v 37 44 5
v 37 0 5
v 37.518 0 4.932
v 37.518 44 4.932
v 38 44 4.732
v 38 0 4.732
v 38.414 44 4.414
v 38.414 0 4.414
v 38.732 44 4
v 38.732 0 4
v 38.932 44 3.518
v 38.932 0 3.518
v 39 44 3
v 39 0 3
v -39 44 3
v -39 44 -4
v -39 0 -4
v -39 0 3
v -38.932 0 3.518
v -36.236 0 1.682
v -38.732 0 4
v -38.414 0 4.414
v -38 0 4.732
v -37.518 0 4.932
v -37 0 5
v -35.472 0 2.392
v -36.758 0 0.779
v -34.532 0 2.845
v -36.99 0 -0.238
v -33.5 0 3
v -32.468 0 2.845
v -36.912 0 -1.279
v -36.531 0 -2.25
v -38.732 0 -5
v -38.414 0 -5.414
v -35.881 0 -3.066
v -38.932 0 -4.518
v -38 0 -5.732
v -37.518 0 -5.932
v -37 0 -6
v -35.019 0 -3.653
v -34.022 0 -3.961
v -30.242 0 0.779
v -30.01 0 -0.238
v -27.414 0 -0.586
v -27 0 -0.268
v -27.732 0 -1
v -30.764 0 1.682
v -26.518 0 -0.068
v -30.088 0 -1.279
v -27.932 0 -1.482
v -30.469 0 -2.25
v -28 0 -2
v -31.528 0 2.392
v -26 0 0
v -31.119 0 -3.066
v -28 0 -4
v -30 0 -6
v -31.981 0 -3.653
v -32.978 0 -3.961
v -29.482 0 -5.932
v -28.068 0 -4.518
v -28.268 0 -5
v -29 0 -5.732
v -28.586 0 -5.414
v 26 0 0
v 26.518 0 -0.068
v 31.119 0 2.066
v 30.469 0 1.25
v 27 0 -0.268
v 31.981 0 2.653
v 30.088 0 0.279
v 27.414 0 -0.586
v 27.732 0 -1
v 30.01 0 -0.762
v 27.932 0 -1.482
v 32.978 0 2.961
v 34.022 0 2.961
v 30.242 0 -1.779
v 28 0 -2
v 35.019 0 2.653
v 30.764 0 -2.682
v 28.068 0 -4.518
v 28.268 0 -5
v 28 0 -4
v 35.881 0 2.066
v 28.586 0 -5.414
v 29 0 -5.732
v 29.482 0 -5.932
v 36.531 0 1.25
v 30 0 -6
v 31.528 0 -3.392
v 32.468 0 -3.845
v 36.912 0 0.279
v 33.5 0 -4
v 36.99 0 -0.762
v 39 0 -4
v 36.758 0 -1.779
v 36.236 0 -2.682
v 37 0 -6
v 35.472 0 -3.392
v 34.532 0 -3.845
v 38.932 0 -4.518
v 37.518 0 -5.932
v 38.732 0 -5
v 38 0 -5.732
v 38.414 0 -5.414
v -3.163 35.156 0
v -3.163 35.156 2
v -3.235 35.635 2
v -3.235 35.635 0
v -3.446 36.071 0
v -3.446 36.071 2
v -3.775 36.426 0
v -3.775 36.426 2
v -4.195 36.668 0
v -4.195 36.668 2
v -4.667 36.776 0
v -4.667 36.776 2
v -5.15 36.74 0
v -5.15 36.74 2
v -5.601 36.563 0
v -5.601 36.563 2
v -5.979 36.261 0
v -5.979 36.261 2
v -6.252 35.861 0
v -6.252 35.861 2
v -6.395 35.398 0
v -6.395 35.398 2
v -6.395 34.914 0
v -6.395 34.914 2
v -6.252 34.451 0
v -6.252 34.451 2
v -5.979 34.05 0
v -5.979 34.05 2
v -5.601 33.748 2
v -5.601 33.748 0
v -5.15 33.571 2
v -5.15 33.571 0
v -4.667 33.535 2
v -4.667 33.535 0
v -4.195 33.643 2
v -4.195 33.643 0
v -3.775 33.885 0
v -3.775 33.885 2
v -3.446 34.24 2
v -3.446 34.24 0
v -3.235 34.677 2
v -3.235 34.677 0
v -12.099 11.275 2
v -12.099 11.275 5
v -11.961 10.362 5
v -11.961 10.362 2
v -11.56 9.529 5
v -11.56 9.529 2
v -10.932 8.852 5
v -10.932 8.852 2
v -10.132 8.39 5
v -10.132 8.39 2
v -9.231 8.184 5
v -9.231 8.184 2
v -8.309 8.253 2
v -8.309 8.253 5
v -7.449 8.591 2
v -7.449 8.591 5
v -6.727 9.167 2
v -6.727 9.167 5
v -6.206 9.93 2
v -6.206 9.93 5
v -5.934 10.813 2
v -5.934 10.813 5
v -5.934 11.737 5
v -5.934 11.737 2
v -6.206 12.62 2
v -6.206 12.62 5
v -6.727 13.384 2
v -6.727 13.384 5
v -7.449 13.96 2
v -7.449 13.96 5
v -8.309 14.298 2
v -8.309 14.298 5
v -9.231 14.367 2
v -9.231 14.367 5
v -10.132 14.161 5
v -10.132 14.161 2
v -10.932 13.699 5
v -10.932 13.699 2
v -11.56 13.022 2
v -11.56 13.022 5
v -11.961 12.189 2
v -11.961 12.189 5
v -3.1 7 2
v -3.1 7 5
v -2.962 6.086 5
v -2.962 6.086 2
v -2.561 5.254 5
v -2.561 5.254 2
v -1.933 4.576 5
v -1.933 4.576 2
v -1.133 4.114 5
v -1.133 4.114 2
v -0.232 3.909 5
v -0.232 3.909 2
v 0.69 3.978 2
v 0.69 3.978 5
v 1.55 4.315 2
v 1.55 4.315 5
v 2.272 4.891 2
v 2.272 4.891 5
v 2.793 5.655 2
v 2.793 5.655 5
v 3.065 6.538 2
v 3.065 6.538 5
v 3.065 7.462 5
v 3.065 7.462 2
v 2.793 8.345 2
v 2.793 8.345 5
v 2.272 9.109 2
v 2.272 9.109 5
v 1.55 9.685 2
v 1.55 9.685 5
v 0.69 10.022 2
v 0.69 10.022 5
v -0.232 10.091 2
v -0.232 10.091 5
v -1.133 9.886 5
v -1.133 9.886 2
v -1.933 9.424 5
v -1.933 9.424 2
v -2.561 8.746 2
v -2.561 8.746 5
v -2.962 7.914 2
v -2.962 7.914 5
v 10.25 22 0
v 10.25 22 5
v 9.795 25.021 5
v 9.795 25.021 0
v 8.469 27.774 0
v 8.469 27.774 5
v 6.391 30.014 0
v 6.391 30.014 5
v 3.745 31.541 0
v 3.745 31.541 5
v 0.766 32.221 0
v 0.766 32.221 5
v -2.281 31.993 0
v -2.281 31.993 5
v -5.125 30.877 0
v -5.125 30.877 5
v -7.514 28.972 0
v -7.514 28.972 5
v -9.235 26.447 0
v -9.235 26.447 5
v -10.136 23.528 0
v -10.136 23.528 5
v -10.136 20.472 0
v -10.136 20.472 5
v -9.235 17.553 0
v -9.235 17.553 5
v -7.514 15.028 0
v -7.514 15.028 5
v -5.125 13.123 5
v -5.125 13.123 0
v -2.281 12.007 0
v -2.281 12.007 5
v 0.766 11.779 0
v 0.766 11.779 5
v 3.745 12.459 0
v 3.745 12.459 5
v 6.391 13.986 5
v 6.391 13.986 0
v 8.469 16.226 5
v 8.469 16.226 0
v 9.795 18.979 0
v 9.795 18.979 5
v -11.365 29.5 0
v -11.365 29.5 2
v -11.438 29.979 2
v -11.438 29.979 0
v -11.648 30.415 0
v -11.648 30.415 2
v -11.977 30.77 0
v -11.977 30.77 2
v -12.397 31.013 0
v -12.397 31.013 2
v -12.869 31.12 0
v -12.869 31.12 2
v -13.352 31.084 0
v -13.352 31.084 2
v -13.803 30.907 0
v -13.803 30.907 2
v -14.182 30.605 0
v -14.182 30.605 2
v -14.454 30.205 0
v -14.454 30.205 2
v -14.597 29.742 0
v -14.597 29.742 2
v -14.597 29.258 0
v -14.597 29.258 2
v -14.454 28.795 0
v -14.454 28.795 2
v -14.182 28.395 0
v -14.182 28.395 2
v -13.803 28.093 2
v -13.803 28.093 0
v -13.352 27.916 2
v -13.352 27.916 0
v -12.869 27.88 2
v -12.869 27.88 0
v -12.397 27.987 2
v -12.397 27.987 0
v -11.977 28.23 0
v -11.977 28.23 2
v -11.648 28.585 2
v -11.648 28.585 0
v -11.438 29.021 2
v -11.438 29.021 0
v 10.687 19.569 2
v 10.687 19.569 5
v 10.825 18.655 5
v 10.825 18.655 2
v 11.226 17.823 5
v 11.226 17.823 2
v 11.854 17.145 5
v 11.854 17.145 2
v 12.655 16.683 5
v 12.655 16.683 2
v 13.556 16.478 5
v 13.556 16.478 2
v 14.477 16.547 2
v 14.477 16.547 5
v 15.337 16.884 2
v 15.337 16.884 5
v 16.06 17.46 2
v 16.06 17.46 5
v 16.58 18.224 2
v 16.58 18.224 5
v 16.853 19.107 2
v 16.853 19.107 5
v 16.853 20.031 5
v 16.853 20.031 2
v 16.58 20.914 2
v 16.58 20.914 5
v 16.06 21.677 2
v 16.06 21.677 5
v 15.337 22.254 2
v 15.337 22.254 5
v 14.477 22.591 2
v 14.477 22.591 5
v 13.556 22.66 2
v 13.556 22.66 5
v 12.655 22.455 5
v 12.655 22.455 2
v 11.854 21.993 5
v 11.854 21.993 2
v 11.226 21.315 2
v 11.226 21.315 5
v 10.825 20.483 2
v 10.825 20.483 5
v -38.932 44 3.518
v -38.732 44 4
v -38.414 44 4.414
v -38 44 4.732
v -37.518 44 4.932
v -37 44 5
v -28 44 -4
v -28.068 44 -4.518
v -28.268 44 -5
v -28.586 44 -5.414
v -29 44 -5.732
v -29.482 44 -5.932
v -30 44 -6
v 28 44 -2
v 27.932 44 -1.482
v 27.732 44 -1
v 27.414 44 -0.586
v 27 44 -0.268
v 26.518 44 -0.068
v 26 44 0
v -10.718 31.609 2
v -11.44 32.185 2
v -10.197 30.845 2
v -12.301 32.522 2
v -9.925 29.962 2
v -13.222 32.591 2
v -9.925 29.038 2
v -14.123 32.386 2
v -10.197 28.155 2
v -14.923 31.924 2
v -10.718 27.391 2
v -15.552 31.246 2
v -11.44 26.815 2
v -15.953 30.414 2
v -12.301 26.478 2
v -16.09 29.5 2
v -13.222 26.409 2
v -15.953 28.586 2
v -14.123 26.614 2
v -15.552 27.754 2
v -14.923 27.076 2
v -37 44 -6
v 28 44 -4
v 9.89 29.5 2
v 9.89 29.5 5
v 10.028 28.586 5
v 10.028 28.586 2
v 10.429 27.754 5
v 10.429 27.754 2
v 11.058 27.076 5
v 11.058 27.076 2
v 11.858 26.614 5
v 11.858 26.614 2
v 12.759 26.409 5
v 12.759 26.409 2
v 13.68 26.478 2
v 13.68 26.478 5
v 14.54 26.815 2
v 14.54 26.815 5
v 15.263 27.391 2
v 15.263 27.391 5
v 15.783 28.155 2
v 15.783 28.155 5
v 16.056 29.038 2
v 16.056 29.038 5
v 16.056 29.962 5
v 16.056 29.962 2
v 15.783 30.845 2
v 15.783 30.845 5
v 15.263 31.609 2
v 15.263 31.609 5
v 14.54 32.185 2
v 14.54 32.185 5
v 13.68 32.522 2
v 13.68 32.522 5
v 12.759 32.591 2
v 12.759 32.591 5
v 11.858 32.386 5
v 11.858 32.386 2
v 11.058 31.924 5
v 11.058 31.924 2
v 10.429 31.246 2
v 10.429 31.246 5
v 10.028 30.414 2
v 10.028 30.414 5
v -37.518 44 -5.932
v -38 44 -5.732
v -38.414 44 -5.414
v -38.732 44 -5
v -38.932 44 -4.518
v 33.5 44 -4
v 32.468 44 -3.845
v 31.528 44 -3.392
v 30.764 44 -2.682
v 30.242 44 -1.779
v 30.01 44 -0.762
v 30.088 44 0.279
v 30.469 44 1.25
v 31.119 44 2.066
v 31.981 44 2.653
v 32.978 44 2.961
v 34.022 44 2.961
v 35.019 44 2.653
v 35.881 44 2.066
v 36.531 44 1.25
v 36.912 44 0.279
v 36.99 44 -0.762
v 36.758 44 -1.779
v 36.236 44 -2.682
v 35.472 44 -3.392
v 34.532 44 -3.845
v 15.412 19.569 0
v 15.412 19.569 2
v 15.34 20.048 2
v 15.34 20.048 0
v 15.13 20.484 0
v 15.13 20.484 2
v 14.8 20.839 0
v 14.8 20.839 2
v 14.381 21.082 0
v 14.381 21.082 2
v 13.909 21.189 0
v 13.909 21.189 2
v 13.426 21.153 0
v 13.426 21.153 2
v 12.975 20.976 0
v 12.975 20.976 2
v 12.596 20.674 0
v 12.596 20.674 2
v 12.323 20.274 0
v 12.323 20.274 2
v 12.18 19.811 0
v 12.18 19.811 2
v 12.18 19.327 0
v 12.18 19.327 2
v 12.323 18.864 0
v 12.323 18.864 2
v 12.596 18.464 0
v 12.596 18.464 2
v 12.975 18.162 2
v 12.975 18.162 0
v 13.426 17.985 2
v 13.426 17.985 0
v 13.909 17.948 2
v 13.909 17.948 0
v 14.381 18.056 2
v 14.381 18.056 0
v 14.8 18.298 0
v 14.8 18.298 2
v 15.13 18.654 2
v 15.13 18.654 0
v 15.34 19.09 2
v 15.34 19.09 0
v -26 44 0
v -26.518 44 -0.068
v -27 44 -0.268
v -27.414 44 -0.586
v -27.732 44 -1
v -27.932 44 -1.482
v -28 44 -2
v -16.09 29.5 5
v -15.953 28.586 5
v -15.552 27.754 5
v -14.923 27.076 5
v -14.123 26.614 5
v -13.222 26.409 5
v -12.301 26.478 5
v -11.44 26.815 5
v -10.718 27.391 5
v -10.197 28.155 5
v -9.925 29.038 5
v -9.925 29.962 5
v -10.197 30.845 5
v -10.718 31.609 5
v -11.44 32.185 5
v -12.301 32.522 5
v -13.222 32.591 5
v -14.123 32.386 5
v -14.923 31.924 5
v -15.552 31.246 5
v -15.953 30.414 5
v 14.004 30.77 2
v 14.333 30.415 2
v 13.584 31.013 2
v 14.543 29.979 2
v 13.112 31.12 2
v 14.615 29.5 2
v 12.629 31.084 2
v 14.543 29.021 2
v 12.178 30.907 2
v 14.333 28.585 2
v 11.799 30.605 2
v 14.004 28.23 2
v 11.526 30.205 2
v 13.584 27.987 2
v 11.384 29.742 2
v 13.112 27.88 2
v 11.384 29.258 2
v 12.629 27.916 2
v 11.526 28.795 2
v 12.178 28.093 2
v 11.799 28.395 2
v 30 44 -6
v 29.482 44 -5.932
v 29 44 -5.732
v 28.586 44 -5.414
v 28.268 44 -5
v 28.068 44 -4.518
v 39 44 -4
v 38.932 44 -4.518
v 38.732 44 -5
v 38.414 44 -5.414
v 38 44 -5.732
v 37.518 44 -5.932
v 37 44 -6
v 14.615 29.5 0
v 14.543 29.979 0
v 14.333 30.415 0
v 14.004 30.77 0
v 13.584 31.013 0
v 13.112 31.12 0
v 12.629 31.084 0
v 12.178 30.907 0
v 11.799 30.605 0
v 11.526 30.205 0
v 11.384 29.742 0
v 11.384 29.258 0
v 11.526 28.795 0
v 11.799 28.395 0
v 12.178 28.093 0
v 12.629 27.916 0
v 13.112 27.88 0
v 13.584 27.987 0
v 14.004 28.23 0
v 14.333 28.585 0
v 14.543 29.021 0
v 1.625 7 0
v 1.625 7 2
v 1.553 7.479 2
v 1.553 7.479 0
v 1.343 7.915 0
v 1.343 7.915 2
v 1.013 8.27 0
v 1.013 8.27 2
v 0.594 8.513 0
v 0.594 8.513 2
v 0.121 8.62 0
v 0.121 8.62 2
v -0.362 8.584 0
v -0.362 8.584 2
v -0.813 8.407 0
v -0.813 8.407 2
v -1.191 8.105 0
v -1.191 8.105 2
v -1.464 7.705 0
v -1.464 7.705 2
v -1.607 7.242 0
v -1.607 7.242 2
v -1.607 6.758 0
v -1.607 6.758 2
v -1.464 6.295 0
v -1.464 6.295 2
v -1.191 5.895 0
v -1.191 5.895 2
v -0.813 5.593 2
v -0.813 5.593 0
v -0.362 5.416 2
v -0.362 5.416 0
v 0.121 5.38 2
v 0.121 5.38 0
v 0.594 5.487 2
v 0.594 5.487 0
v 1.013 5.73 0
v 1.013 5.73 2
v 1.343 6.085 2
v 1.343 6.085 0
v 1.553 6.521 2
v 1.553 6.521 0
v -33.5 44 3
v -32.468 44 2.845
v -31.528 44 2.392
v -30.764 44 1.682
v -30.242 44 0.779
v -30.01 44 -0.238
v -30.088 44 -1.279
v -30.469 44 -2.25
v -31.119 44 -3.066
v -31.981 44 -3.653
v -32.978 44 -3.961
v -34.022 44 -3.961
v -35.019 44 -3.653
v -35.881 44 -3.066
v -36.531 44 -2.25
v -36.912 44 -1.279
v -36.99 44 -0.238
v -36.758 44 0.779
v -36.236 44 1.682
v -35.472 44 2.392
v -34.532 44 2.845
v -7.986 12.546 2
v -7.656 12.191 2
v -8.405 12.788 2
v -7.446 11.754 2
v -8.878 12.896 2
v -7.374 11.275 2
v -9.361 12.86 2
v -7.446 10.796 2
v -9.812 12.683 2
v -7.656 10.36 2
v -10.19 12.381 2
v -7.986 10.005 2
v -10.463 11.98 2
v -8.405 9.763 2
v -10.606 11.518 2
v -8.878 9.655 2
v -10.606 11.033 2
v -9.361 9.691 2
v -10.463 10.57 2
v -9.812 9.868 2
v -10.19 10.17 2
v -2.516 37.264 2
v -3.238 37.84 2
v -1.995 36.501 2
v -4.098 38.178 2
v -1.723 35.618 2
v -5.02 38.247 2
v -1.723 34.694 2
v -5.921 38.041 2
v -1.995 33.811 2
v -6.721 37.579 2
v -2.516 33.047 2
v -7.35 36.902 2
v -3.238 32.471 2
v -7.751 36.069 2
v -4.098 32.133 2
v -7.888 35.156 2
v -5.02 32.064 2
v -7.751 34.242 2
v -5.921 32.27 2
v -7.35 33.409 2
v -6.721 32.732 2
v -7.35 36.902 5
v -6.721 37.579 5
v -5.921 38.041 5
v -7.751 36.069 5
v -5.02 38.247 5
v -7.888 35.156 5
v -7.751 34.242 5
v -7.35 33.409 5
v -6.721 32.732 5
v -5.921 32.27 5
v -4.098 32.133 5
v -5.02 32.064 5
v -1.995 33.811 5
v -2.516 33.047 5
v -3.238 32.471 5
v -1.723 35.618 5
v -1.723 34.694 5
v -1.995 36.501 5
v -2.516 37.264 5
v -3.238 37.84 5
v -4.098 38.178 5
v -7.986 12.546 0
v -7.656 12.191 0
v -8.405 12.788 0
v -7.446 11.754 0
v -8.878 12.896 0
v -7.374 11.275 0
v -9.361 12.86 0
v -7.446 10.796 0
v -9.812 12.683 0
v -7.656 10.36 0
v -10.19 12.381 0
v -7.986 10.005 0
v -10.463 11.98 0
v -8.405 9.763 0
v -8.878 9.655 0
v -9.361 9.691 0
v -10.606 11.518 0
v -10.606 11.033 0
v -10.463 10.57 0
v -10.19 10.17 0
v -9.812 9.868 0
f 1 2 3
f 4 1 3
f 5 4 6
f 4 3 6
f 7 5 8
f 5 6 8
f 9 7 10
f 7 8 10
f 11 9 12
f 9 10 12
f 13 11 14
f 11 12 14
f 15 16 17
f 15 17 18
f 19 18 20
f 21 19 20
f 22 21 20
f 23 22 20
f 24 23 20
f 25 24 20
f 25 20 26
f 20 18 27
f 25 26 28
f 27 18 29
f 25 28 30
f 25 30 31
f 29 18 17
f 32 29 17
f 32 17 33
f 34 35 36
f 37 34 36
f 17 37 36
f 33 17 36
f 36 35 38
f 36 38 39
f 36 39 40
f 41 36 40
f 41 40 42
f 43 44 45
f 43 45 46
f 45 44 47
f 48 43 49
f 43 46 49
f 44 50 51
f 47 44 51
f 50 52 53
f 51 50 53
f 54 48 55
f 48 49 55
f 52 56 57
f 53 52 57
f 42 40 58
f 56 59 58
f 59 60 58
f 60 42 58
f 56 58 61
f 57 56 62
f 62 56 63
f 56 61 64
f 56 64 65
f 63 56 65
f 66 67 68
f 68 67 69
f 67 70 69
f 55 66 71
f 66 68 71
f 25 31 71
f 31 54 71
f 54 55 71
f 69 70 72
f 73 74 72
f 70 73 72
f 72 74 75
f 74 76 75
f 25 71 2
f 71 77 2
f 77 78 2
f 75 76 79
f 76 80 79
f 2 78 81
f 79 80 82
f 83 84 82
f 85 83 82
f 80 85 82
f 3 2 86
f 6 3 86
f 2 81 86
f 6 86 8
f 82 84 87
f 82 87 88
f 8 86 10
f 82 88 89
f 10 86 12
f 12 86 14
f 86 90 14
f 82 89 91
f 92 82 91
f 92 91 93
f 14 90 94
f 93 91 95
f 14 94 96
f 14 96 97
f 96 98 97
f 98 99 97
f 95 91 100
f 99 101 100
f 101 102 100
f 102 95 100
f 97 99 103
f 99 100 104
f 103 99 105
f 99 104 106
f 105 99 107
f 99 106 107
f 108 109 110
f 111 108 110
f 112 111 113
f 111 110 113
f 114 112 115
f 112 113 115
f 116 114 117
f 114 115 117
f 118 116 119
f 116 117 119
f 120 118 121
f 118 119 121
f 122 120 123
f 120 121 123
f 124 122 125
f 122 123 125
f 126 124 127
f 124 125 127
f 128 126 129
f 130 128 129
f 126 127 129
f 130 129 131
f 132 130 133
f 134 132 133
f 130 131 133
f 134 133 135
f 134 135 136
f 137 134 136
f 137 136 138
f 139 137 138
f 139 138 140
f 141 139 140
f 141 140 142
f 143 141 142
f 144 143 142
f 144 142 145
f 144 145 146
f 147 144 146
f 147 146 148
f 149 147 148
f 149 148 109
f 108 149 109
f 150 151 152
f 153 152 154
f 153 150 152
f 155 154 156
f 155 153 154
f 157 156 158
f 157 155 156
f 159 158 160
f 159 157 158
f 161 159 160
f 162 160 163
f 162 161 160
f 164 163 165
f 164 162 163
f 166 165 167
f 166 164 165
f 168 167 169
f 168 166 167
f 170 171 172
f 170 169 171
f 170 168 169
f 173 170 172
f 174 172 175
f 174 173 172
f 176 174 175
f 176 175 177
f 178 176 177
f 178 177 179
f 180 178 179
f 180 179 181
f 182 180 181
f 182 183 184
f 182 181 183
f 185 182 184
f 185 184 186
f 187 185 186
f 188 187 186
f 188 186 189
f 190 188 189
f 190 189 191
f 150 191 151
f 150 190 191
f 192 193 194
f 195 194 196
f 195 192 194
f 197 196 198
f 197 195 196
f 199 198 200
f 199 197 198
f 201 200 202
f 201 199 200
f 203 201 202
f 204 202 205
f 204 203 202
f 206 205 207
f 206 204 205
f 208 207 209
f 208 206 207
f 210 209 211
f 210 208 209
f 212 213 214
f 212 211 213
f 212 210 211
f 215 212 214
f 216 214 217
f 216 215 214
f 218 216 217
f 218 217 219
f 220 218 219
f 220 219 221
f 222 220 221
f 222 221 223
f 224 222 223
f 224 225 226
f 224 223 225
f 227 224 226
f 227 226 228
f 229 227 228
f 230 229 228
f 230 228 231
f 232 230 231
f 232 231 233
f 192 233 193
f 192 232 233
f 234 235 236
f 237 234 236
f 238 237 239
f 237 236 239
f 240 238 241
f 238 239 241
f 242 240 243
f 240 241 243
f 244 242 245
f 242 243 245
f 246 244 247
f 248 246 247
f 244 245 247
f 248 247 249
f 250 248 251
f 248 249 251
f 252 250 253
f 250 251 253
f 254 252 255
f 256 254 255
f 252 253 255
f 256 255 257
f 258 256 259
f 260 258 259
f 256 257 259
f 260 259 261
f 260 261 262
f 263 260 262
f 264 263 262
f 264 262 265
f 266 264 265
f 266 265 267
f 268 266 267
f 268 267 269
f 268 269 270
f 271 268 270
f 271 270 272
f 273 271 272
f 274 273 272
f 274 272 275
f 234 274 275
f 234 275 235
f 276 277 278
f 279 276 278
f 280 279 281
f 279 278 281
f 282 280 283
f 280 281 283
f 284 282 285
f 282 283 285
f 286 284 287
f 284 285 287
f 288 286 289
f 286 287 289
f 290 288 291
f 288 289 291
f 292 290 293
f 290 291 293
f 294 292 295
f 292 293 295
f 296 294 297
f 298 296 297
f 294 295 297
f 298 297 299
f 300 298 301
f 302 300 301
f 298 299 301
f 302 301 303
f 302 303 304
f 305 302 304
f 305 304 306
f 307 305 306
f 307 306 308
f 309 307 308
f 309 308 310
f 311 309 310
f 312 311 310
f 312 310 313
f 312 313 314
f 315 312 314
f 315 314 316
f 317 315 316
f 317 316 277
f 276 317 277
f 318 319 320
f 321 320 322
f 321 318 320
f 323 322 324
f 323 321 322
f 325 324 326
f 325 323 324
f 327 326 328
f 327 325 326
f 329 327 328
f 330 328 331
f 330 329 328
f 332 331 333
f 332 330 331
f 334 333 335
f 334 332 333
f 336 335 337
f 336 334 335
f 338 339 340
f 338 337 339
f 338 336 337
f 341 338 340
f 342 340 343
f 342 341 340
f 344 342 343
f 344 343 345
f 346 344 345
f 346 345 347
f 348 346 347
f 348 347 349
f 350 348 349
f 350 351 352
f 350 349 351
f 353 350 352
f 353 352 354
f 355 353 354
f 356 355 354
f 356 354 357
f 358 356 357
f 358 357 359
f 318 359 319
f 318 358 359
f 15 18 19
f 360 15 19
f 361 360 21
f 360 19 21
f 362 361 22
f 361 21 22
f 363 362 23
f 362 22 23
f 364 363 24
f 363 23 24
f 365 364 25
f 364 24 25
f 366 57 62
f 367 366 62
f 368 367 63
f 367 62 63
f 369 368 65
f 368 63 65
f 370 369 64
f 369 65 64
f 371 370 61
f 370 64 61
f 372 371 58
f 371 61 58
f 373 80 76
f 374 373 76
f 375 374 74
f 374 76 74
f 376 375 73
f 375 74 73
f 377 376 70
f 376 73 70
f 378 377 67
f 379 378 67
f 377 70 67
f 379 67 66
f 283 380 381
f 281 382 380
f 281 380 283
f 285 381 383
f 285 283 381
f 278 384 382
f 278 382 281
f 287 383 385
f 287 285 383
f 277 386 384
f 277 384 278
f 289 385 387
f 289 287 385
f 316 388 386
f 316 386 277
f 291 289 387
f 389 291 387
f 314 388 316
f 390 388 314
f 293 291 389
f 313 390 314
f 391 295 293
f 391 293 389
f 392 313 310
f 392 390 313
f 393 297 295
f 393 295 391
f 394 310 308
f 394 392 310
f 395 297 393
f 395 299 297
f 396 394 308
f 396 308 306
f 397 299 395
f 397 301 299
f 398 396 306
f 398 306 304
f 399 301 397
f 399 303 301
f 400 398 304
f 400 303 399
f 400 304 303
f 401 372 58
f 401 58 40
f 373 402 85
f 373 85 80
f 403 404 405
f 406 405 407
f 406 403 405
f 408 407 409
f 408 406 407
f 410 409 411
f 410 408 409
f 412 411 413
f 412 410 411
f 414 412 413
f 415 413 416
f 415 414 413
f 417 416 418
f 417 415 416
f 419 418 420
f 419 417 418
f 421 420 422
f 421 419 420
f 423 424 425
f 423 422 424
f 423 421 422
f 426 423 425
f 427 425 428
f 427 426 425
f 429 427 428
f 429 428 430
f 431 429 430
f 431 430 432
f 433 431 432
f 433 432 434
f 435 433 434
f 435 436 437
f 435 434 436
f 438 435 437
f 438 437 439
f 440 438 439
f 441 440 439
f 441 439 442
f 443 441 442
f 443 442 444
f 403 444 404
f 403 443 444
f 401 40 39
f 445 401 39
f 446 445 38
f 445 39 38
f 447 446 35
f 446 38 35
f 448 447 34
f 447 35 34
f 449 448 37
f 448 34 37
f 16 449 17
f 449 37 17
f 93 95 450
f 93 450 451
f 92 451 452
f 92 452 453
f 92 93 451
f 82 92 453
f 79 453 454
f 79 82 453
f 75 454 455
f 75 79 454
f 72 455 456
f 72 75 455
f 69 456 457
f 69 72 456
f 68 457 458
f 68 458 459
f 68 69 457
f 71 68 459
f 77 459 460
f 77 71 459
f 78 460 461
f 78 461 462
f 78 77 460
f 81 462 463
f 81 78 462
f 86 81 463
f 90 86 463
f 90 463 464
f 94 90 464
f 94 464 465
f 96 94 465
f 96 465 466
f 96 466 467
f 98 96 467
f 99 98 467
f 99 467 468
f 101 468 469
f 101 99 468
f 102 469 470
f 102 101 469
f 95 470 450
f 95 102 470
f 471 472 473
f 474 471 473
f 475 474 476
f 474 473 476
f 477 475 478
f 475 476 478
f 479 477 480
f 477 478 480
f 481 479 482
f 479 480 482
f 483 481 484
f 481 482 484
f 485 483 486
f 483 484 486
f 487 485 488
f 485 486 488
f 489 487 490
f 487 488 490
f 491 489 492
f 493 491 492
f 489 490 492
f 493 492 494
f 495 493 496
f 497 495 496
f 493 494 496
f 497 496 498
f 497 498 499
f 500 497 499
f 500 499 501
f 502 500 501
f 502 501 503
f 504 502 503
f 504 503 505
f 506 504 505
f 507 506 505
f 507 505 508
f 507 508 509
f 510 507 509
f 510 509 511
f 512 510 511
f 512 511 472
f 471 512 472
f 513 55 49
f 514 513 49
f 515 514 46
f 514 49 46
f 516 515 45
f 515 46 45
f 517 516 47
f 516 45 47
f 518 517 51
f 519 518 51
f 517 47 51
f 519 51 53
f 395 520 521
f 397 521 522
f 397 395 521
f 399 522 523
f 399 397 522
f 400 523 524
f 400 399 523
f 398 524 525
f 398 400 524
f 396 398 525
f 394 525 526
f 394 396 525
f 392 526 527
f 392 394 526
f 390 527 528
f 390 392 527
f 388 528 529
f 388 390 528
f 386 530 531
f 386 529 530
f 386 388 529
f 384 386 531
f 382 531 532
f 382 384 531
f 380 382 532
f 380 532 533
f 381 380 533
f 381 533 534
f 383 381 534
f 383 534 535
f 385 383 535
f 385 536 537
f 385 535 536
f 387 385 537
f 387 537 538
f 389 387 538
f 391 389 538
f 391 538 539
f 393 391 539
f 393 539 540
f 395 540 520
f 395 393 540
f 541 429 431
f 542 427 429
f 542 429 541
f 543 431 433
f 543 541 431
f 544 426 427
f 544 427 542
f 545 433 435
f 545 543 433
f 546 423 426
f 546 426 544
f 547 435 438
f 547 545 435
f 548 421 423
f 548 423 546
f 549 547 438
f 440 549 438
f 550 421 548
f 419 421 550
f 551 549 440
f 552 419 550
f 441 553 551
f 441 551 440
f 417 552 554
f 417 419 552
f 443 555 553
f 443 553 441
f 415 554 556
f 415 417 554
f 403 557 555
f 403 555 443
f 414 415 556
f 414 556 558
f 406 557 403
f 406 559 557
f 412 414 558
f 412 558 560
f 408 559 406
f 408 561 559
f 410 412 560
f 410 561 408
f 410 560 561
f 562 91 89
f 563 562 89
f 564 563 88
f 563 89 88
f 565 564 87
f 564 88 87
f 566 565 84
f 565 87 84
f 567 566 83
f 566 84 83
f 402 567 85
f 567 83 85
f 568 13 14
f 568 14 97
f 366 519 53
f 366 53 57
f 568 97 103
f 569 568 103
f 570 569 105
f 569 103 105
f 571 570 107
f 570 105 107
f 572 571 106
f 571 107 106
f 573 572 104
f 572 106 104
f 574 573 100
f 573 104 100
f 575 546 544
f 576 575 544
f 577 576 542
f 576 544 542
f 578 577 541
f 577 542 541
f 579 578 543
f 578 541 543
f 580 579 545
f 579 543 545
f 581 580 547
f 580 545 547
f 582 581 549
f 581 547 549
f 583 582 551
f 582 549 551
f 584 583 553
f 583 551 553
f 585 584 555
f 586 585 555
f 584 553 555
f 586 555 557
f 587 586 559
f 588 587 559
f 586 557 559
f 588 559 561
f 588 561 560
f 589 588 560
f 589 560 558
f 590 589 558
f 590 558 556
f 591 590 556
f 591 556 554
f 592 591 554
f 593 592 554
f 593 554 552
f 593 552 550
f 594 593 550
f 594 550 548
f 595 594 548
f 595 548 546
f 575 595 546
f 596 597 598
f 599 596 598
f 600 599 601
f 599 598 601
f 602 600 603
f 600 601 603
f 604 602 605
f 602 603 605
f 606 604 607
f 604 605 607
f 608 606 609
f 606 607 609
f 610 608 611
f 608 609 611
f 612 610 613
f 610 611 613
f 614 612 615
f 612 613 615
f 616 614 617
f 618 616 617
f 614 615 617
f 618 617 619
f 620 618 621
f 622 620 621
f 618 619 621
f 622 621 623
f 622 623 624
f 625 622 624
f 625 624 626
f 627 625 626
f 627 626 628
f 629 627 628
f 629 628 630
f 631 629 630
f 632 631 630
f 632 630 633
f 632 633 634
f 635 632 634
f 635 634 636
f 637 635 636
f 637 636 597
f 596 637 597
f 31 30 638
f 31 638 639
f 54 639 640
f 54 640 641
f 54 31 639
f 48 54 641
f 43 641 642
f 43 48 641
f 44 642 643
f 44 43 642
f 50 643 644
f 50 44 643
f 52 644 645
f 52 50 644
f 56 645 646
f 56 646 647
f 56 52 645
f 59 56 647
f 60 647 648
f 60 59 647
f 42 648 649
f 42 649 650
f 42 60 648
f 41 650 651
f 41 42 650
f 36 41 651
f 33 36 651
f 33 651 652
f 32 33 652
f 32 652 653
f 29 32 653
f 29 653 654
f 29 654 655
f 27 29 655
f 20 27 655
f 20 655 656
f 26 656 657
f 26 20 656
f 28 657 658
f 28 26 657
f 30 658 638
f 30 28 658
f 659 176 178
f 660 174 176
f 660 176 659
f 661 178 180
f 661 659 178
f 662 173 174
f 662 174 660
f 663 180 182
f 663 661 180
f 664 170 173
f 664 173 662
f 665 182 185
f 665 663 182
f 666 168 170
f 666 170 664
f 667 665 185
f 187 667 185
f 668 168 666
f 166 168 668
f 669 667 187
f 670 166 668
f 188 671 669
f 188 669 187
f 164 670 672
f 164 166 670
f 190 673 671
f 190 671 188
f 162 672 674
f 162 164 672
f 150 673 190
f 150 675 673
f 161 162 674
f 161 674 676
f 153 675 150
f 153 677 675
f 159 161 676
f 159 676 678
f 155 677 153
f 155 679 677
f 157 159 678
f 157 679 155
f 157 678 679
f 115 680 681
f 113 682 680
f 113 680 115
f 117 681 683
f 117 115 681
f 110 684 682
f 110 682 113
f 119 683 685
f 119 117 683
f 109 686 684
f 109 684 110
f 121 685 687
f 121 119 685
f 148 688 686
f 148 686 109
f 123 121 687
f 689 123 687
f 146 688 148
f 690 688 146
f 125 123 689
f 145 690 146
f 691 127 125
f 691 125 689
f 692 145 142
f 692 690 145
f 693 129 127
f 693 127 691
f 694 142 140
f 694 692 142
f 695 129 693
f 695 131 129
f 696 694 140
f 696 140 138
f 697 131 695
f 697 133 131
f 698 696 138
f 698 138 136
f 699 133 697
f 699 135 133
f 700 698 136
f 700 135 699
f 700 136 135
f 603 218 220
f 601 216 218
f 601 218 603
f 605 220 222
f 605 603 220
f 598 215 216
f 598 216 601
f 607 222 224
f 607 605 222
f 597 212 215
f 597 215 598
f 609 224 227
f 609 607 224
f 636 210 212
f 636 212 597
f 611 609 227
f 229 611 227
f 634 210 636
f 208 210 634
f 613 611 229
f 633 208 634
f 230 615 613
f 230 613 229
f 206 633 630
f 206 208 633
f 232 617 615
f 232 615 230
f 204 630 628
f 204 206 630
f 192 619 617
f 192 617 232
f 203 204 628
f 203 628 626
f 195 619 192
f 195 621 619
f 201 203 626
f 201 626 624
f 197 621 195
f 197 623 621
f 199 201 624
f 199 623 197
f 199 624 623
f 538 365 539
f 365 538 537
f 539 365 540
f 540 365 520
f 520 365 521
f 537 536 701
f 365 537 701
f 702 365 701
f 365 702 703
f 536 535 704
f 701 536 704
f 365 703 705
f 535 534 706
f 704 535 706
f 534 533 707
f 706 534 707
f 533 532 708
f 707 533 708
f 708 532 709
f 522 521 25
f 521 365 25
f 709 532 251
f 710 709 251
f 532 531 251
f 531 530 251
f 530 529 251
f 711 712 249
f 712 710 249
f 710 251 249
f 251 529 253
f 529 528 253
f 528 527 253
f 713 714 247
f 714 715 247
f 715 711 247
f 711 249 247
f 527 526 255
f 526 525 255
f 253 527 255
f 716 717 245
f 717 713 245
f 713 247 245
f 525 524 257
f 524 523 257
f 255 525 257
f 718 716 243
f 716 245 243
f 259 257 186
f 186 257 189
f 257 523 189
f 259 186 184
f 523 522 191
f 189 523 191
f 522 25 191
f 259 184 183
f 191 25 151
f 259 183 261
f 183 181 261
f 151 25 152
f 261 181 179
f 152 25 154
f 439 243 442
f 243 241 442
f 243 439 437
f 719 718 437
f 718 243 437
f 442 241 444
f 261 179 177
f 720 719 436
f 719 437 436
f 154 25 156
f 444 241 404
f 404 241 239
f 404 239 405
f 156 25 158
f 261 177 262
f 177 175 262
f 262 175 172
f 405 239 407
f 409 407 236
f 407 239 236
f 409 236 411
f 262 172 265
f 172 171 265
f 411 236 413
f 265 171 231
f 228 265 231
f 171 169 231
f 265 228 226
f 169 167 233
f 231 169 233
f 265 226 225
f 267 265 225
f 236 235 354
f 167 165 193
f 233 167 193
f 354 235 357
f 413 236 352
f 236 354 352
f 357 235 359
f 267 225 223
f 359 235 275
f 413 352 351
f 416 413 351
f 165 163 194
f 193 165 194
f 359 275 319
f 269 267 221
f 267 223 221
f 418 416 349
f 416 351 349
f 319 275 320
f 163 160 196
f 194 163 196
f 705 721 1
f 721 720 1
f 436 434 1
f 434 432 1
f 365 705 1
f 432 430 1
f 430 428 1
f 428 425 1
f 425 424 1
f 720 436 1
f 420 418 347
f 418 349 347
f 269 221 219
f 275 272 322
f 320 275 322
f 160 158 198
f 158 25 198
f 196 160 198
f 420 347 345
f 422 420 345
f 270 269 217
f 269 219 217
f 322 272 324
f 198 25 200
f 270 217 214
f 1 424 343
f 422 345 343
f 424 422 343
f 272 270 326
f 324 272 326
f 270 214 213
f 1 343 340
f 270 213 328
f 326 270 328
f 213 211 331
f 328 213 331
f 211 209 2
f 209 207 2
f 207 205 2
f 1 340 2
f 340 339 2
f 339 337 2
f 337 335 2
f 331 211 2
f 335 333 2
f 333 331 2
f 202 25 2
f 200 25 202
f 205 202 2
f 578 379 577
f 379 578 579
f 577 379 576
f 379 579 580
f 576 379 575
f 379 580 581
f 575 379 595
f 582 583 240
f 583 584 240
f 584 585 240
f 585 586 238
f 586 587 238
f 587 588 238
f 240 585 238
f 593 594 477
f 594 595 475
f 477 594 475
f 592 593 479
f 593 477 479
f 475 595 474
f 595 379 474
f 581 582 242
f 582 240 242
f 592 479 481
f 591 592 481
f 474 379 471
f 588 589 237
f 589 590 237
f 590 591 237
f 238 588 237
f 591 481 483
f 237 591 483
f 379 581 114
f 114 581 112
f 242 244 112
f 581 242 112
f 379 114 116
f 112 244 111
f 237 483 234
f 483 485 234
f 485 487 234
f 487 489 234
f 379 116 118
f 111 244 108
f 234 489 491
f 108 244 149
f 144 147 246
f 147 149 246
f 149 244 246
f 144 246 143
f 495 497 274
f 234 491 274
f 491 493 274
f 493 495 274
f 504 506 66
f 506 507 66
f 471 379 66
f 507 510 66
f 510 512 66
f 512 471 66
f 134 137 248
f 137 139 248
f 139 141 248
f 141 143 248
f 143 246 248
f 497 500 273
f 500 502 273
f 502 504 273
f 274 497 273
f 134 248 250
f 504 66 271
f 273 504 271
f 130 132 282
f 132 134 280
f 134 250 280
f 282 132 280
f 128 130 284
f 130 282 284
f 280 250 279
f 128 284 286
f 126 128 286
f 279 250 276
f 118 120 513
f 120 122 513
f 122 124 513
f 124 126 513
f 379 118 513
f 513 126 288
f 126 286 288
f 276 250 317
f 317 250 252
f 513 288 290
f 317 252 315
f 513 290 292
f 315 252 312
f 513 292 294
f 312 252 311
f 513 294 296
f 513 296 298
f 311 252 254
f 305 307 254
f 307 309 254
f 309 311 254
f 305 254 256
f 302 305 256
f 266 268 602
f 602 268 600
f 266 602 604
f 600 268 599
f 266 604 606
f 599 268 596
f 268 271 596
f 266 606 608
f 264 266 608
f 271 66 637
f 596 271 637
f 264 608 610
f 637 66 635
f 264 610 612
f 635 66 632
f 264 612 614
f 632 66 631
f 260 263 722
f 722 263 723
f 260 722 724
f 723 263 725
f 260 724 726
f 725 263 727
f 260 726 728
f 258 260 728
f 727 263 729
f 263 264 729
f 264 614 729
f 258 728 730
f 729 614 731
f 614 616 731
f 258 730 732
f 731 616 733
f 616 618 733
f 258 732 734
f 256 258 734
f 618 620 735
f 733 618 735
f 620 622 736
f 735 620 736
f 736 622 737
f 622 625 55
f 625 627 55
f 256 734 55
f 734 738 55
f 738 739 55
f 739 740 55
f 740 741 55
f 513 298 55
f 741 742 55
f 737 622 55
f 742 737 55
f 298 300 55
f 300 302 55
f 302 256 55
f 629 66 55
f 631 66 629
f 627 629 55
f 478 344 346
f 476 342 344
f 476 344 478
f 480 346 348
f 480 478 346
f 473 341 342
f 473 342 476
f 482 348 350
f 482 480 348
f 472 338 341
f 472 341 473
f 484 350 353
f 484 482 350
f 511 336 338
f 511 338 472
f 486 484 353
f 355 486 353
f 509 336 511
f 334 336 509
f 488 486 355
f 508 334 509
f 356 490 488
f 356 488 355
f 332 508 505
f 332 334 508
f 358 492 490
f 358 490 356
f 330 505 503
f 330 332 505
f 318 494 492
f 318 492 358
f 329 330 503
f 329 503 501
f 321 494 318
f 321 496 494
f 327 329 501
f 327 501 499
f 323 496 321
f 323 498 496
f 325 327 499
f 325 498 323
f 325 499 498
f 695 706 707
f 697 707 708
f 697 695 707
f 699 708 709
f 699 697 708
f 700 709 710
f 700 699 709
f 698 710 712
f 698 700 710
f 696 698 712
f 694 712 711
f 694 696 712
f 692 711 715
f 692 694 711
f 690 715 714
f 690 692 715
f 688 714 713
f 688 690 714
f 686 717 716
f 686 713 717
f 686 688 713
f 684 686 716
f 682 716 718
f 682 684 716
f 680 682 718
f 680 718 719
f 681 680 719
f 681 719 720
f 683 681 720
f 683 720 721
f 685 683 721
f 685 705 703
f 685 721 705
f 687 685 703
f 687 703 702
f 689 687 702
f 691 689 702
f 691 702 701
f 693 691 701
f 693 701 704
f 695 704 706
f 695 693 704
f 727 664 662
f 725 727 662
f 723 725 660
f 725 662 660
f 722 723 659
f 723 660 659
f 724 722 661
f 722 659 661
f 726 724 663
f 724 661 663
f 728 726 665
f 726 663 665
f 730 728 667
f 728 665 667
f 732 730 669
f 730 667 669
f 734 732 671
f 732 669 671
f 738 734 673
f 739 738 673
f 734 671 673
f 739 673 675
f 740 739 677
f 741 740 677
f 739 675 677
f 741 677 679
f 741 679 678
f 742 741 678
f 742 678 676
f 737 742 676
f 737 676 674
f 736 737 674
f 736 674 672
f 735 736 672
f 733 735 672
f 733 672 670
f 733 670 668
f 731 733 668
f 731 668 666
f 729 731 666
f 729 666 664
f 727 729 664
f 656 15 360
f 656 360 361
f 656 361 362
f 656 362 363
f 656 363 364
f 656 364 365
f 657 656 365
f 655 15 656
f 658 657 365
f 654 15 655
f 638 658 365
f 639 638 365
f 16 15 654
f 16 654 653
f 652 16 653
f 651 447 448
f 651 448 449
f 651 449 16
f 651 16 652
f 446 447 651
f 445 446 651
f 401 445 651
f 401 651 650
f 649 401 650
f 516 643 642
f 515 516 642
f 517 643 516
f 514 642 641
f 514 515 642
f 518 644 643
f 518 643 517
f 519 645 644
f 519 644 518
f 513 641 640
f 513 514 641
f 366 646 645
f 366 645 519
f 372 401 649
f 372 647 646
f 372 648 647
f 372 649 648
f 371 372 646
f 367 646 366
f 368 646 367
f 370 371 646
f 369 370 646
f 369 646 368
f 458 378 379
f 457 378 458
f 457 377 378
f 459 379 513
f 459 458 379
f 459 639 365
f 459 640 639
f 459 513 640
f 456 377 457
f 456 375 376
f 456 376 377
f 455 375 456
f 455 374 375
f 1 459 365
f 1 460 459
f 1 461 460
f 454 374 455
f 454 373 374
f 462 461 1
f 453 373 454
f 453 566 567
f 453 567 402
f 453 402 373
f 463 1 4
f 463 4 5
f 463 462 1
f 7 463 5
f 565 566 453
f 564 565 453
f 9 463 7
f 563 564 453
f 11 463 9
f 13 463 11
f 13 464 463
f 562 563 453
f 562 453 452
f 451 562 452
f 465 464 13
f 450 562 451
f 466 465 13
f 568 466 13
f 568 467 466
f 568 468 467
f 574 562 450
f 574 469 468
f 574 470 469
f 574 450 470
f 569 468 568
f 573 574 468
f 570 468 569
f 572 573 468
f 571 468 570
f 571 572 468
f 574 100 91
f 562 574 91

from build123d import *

# Parameters (mm, degrees)
ESQUISSE3_R                  = 3.5
BOSS_EXTRU_1_DEPTH           = 44
ESQUISSE4_R                  = 10.25
ESQUISSE4_R_2                = 1.625
ENL_V_MAT_EXTRU_1_DEPTH      = 60
ENL_V_MAT_EXTRU_2_DEPTH      = 60.816385715
ENL_V_MAT_EXTRU_2_DEPTH_BACK = 3
ESQUISSE6_R                  = 3.1


with BuildPart() as part:
    # Esquisse3 → Boss.-Extru.1 (new body)
    with BuildSketch(Plane(origin=(0, 0, 0), x_dir=(1, 0, 0), z_dir=(0, 1, 0))):
        with BuildLine():
            Line((26, 0), (-26, 0))
            ThreePointArc((-26, 0), (-27.414213562, 0.585786438), (-28, 2))
            Line((-28, 2), (-28, 4))
            ThreePointArc((-28, 4), (-28.585786438, 5.414213562), (-30, 6))
            Line((-30, 6), (-37, 6))
            ThreePointArc((-37, 6), (-38.414213562, 5.414213562), (-39, 4))
            Line((-39, 4), (-39, -3))
            ThreePointArc((-39, -3), (-38.414213562, -4.414213562), (-37, -5))
            Line((-37, -5), (37, -5))
            ThreePointArc((37, -5), (38.414213562, -4.414213562), (39, -3))
            Line((39, -3), (39, 4))
            ThreePointArc((39, 4), (38.414213562, 5.414213562), (37, 6))
            Line((37, 6), (30, 6))
            ThreePointArc((30, 6), (28.585786438, 5.414213562), (28, 4))
            Line((28, 4), (28, 2))
            ThreePointArc((28, 2), (27.414213562, 0.585786438), (26, 0))
        make_face()
        with Locations(Location((-33.5, 0.5, 0), (0, 0, 270))):
            Circle(ESQUISSE3_R, mode=Mode.SUBTRACT)
        with Locations(Location((33.5, 0.5, 0), (0, 0, 90))):
            Circle(ESQUISSE3_R, mode=Mode.SUBTRACT)
    extrude(amount=BOSS_EXTRU_1_DEPTH)

    # Esquisse4 → Enlèv. mat.-Extru.1 (cut)
    with BuildSketch(Plane.XY.offset(5)):
        with Locations((0, 22)):
            Circle(ESQUISSE4_R)
        with Locations((0, 7)):
            Circle(ESQUISSE4_R_2)
        with Locations((-8.999026536, 11.275377796)):
            Circle(ESQUISSE4_R_2)
        with Locations((13.787308542, 19.568925513)):
            Circle(ESQUISSE4_R_2)
        with Locations((12.990381057, 29.5)):
            Circle(ESQUISSE4_R_2)
        with Locations((-4.788282007, 35.155696691)):
            Circle(ESQUISSE4_R_2)
        with Locations((-12.990381057, 29.5)):
            Circle(ESQUISSE4_R_2)
    extrude(amount=-ENL_V_MAT_EXTRU_1_DEPTH, mode=Mode.SUBTRACT)

    # Esquisse6 → Enlèv. mat.-Extru.2 (cut, two sides: drawn at the far end of the back side and taken through both)
    with BuildSketch(Plane.XY.offset(5).offset(-ENL_V_MAT_EXTRU_2_DEPTH_BACK)):
        with Locations(Location((0, 7, 0), (0, 0, 180))):
            Circle(ESQUISSE6_R)
        with Locations(Location((-8.999026536, 11.275377796, 0), (0, 0, 180))):
            Circle(ESQUISSE6_R)
        with Locations(Location((-4.788282007, 35.155696691, 0), (0, 0, 180))):
            Circle(ESQUISSE6_R)
        with Locations(Location((-12.990381057, 29.5, 0), (0, 0, 180))):
            Circle(ESQUISSE6_R)
        with Locations(Location((13.787308542, 19.568925513, 0), (0, 0, 180))):
            Circle(ESQUISSE6_R)
        with Locations(Location((12.990381057, 29.5, 0), (0, 0, 180))):
            Circle(ESQUISSE6_R)
    extrude(amount=ENL_V_MAT_EXTRU_2_DEPTH + ENL_V_MAT_EXTRU_2_DEPTH_BACK, mode=Mode.SUBTRACT)


solid = part.part
